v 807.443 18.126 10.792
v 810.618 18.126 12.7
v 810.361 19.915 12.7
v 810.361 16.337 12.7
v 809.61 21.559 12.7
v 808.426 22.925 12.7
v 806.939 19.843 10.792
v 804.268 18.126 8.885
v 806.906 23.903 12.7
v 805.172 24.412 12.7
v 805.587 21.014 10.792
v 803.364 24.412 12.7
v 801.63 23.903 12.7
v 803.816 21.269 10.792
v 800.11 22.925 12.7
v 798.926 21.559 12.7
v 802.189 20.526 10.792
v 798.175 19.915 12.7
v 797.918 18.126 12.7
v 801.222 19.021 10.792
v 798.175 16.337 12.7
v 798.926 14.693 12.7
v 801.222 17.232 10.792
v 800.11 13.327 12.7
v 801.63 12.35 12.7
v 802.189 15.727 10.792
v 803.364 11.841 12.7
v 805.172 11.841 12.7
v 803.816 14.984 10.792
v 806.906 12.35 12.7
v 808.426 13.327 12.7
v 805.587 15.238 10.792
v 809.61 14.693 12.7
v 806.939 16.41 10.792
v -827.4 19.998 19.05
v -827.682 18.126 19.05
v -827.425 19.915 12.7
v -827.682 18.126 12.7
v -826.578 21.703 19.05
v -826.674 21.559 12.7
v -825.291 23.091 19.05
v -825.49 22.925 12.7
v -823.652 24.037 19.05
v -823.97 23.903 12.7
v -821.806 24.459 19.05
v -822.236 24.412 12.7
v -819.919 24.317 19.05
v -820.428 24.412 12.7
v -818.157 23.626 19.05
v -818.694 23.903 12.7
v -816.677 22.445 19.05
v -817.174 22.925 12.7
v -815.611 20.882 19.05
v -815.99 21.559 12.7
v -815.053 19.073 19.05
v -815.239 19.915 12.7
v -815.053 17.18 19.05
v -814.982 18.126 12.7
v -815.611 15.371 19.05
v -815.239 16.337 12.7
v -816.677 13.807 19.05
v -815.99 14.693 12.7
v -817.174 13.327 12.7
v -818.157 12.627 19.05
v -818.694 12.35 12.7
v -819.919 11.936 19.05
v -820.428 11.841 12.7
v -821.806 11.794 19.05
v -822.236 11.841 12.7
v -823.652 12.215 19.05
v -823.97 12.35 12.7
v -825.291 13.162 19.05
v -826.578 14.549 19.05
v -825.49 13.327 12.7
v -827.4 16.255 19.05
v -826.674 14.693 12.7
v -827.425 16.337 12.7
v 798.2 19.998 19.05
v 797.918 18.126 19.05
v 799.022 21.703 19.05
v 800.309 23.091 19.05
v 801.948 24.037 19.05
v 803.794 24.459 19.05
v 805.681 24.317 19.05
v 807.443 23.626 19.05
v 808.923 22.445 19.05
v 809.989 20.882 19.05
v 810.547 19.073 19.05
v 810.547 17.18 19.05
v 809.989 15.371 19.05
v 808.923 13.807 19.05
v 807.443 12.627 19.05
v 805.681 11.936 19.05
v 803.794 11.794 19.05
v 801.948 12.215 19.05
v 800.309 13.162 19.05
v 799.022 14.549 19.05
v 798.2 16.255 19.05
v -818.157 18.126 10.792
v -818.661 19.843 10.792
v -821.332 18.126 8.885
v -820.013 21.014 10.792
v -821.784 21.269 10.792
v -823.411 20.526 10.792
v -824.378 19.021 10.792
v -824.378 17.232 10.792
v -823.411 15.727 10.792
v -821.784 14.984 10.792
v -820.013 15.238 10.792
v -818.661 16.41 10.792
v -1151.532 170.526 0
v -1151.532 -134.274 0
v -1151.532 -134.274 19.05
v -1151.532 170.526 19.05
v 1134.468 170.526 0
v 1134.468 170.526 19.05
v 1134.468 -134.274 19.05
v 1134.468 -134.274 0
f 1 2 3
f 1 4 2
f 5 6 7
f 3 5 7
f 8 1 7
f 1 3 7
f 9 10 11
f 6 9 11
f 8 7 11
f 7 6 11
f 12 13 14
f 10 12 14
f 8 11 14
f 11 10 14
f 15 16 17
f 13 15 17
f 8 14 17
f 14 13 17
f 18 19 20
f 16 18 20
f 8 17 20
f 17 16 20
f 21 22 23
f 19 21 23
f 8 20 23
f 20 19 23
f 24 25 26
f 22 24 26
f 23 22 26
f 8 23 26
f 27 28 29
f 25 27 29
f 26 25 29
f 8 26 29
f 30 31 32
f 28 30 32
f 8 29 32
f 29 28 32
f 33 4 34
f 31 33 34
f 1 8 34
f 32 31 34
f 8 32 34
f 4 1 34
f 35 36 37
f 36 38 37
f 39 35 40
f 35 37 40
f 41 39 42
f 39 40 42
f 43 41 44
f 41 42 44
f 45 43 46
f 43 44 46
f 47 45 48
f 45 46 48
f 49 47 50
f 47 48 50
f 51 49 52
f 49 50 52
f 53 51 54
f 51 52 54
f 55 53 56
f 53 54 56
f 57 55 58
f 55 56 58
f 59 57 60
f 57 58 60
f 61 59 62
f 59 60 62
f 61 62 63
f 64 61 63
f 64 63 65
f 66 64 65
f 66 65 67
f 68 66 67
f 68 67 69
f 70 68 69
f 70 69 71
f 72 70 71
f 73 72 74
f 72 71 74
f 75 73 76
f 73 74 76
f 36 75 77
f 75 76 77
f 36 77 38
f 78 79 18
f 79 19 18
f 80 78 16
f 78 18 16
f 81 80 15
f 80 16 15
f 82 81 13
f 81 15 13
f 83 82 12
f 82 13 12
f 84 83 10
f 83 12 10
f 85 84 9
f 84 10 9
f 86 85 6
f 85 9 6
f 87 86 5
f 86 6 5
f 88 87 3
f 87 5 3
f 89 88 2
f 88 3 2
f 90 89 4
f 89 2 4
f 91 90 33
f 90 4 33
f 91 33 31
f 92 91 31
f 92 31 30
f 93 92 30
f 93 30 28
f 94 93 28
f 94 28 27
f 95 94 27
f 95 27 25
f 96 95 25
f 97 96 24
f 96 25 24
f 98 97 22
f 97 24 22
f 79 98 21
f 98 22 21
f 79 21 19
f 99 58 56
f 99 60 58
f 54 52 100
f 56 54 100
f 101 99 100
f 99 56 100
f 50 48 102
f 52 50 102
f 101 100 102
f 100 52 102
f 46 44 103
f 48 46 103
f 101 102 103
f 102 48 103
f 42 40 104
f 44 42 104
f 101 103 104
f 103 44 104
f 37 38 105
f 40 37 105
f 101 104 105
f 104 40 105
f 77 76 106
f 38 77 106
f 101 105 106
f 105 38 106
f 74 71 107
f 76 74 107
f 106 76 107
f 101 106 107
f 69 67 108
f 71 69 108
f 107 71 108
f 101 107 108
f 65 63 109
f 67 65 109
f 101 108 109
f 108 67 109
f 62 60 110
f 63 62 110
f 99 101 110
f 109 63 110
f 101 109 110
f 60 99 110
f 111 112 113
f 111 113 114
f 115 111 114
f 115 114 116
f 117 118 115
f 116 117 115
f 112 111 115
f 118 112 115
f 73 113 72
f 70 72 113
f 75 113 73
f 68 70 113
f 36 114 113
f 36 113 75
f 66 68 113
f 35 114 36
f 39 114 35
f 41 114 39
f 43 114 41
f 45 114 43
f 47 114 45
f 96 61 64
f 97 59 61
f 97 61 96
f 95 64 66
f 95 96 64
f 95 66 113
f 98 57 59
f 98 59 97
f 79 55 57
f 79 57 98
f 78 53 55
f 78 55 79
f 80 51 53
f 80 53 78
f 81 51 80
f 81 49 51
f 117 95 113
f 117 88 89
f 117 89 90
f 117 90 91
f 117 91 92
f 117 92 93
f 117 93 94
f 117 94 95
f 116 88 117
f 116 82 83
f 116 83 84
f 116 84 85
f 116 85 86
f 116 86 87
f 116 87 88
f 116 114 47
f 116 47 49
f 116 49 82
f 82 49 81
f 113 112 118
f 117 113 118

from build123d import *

# Parameters (mm, degrees)
F0_W     = 2286
F0_H     = 304.8
F1_DEPTH = 19.05
F3_D     = 12.7
F3_DEPTH = 6.35
F3_TIP   = 3.8154649308


with BuildPart() as f1:
    # F0 (on Top) → F1 (new body)
    with BuildSketch(Plane.XY):
        with Locations((-8.5318703204, 18.1263682907)):
            Rectangle(F0_W, F0_H)
    extrude(amount=F1_DEPTH)

    # F3
    with Locations(Plane.XY.offset(19.05)):
        with Locations((-821.3318703204, 18.1263682907), (804.2681296796, 18.1263682907)):
            Hole(F3_D / 2, depth=F3_DEPTH)
            with Locations((0, 0, -(F3_DEPTH + F3_TIP / 2))):  # 118° drill point
                Cone(0, F3_D / 2, F3_TIP, mode=Mode.SUBTRACT)


solid = f1.part
